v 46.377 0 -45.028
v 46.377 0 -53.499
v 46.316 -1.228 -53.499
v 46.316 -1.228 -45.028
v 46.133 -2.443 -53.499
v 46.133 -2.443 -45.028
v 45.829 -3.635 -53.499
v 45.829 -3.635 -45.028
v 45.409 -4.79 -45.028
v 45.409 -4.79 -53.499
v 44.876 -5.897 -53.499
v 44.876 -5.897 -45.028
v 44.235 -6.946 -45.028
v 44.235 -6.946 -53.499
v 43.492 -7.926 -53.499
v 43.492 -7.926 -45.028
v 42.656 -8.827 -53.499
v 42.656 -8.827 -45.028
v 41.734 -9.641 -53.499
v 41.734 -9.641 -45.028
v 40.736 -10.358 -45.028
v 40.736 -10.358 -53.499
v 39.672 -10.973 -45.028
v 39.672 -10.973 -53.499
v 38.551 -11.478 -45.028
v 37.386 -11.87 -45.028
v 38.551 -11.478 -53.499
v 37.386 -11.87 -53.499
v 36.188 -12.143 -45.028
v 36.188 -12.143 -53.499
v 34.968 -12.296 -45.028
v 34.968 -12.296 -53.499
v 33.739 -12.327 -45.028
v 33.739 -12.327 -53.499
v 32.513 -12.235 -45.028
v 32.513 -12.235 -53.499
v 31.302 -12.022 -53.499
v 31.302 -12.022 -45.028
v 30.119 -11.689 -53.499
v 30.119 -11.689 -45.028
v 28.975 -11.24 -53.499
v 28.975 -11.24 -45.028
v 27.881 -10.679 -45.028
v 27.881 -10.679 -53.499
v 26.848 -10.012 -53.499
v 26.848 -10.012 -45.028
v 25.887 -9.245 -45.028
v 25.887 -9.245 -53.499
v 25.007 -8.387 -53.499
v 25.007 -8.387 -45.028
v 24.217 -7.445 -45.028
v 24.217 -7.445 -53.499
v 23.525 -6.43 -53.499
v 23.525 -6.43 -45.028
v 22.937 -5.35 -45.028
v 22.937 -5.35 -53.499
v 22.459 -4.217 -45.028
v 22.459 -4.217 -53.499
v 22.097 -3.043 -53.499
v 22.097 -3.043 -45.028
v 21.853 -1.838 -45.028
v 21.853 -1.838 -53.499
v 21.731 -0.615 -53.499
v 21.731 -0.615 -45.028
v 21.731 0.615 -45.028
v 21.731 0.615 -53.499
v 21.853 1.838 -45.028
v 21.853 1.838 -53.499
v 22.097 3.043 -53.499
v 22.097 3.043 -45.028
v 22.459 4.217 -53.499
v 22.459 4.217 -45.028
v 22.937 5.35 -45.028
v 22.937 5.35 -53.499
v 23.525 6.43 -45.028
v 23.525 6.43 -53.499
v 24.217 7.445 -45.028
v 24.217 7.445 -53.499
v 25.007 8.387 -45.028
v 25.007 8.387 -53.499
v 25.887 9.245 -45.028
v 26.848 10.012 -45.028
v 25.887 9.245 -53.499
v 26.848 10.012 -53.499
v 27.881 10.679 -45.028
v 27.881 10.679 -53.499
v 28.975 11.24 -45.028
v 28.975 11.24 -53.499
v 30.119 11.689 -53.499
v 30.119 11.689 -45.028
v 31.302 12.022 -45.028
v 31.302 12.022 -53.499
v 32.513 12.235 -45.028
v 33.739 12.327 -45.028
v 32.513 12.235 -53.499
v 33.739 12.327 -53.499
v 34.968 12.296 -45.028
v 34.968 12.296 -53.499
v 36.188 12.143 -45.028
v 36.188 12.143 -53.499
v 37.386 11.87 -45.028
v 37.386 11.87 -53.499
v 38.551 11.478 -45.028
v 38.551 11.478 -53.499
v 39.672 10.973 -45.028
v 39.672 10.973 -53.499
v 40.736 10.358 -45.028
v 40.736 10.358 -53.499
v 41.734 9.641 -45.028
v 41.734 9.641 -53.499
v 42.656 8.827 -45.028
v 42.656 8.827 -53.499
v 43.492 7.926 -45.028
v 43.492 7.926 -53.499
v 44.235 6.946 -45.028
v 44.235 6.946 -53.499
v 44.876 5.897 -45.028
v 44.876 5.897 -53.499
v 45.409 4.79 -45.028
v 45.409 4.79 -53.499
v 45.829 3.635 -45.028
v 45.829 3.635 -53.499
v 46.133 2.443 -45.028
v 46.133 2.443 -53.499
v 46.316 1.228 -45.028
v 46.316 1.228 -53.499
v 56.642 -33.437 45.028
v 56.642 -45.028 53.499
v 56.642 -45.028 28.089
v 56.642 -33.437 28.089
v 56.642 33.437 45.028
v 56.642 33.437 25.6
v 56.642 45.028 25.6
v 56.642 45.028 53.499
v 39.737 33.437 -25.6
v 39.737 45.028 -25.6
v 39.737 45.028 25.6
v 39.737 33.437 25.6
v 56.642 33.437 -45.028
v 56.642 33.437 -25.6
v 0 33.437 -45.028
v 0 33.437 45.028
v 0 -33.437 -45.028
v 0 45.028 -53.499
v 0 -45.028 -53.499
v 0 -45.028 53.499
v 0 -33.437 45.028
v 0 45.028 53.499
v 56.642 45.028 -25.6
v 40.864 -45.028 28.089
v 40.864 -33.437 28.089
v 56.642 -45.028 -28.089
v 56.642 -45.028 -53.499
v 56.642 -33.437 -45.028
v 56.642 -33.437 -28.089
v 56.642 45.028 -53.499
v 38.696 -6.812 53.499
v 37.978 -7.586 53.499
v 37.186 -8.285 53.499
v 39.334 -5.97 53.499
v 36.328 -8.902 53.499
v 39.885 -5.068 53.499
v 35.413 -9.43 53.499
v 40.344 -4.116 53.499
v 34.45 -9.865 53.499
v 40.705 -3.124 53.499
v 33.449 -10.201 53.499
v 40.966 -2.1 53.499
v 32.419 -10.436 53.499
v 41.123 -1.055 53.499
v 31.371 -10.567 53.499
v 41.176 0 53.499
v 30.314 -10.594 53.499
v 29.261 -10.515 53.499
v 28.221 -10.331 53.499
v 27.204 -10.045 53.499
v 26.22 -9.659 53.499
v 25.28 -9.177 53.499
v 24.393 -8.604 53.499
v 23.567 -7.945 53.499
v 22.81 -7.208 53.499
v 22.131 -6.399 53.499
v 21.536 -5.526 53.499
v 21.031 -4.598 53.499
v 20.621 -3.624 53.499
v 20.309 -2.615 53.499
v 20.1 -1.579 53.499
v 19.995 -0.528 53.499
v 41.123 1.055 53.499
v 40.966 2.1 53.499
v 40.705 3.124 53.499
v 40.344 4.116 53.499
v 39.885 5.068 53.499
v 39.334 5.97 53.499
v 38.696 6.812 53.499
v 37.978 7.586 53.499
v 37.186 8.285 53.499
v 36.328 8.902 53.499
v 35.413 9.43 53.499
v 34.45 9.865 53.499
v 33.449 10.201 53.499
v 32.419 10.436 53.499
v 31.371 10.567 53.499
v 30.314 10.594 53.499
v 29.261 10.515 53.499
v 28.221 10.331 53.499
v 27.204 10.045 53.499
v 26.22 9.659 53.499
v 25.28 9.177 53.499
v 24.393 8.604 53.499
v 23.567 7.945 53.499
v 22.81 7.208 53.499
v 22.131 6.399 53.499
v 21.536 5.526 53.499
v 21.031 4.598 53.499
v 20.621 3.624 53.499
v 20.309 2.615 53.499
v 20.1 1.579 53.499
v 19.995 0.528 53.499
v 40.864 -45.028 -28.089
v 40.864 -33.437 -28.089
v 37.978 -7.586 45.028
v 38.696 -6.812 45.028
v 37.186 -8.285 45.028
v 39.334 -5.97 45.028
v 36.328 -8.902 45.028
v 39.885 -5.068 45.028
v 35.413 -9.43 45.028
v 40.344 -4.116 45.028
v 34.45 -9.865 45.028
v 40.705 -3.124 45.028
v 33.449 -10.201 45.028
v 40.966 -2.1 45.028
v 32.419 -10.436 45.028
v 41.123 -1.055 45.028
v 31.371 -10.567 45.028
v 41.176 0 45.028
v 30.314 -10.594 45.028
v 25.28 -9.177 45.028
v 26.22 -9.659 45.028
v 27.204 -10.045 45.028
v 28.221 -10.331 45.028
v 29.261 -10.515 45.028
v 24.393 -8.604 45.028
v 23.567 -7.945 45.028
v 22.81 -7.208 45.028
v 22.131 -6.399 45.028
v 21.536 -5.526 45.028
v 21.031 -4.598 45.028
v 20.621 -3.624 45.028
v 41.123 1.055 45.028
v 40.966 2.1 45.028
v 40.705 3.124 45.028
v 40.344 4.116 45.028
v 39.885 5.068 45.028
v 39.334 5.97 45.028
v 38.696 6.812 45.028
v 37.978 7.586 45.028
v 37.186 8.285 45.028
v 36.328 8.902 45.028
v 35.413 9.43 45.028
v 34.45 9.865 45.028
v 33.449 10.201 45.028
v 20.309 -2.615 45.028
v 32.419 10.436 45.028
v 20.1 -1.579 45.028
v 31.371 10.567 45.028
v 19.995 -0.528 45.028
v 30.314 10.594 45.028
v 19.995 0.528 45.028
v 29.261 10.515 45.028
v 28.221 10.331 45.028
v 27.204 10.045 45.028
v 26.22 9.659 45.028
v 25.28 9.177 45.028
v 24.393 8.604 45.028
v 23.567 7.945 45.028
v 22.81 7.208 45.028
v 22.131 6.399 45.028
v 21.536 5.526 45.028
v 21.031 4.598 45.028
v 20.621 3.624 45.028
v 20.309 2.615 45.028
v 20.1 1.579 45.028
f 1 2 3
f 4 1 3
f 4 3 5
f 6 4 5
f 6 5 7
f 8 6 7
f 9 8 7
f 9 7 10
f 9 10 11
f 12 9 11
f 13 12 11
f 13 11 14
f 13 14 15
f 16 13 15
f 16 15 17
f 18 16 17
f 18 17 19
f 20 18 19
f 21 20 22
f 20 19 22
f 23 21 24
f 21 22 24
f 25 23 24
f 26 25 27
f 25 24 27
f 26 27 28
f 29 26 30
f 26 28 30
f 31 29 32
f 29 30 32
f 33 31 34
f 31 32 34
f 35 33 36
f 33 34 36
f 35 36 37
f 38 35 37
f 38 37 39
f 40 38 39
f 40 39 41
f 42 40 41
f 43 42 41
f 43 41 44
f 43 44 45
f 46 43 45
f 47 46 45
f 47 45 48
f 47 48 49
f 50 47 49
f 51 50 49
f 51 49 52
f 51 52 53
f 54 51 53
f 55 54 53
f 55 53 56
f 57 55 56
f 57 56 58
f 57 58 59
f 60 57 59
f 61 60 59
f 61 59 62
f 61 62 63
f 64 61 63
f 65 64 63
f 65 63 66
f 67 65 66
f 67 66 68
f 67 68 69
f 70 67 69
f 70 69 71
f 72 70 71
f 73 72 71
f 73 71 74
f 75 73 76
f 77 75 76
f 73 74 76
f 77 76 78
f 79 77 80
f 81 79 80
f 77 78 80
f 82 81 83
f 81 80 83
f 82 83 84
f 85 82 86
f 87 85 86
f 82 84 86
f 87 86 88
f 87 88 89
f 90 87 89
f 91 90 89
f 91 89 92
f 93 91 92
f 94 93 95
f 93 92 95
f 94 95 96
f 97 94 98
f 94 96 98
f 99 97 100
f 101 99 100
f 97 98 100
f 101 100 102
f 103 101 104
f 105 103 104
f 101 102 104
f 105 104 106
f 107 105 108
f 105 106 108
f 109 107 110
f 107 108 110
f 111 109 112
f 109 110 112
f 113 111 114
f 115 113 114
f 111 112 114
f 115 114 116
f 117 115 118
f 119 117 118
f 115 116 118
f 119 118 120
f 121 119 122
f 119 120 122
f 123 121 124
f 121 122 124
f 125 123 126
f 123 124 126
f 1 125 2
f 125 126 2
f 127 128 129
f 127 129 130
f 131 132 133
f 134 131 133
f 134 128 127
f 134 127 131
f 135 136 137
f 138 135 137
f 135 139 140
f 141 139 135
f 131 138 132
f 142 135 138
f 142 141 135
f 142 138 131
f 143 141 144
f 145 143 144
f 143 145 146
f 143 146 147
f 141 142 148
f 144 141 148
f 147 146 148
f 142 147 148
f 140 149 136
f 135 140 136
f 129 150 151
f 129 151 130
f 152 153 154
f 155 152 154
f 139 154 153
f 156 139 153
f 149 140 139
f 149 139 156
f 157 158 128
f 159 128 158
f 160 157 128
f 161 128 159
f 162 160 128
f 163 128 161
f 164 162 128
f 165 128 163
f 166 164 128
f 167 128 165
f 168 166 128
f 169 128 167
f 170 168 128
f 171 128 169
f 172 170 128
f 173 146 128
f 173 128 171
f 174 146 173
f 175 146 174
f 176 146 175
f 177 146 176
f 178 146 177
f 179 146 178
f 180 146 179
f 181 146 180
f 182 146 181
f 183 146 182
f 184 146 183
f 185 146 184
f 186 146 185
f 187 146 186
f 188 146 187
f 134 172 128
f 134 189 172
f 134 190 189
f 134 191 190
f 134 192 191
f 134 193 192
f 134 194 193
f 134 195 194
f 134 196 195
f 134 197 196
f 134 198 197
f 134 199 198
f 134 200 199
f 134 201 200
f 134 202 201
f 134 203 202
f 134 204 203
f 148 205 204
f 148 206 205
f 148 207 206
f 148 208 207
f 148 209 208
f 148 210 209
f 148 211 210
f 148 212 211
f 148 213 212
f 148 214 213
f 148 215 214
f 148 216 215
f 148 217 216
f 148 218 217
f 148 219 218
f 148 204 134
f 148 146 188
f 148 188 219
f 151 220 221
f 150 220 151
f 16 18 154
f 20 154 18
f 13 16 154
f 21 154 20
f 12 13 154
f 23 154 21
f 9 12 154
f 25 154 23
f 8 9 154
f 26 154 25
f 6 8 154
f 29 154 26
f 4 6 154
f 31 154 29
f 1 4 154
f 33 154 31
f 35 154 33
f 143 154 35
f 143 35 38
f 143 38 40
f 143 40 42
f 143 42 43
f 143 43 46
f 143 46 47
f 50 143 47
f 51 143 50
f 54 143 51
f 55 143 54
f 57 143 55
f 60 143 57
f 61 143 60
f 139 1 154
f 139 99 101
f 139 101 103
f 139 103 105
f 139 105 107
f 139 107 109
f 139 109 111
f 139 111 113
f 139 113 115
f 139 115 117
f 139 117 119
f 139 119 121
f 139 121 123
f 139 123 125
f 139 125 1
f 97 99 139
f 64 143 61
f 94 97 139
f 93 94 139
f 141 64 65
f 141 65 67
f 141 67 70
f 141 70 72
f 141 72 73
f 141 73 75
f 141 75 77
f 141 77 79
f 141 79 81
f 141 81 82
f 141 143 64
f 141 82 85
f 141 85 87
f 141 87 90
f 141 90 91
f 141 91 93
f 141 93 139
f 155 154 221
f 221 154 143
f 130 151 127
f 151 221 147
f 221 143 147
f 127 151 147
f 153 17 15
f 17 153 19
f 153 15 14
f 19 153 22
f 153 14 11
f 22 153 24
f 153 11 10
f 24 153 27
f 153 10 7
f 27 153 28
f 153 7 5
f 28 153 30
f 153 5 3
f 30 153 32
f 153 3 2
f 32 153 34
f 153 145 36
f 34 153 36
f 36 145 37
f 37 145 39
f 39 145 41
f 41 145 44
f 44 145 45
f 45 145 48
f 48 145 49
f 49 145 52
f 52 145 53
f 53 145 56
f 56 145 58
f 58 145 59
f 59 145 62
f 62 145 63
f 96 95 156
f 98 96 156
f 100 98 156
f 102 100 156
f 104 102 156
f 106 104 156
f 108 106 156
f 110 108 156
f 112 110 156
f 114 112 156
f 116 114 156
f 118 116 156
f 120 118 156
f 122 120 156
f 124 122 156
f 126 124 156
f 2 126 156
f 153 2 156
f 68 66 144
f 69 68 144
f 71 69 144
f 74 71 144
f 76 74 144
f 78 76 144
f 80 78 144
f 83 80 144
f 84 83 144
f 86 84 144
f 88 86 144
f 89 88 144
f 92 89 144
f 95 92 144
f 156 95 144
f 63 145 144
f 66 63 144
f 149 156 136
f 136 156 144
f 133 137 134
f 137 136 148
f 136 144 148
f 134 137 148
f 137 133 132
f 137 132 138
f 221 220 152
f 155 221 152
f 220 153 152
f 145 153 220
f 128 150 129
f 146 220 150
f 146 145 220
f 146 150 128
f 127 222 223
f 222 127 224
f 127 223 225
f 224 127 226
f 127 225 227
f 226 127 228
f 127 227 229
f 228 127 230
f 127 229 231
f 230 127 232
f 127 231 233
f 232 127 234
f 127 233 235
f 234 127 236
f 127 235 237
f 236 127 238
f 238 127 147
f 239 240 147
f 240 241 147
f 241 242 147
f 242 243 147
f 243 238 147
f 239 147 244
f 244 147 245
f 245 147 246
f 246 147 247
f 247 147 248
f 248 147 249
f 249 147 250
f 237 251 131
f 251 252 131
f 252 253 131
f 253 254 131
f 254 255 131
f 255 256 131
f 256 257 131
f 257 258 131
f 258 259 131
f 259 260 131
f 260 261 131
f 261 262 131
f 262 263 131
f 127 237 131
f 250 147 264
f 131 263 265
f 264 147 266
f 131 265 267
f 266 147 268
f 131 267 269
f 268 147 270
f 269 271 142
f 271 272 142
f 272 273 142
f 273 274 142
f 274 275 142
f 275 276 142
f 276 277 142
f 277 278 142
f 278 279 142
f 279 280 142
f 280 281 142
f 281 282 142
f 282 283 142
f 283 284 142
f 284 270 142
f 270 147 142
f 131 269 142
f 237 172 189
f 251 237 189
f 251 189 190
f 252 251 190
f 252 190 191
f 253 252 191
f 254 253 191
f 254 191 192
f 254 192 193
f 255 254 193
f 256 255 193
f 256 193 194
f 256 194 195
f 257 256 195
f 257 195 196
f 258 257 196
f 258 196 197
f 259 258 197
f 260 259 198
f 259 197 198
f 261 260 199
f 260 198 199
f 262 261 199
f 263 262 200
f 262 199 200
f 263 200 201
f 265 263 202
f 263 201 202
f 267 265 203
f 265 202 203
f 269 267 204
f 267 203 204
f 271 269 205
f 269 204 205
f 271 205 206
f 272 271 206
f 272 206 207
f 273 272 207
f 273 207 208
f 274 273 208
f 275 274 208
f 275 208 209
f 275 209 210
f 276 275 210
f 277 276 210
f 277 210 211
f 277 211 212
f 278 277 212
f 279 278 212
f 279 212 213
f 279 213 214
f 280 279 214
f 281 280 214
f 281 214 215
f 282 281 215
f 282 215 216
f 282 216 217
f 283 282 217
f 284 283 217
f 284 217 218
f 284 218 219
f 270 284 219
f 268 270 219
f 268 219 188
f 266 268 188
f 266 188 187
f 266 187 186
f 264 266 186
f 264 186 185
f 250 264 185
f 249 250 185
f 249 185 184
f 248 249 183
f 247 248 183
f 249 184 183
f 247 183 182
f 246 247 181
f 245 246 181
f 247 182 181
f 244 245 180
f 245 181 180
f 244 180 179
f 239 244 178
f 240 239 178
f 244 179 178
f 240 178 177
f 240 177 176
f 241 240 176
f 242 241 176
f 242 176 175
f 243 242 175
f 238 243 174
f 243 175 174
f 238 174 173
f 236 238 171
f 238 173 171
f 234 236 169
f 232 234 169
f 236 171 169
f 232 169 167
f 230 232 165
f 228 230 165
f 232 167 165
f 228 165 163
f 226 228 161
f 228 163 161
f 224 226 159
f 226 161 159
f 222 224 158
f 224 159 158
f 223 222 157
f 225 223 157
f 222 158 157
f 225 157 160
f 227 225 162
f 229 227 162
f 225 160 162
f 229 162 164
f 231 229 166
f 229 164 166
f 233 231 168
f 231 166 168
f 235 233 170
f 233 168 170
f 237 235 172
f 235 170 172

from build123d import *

# Parameters (mm, degrees)
F0_W     = 90.0560617447
F0_H     = 106.9972887635
F0_W_2   = 66.873319447
F0_H_2   = 90.0560542941
F1_DEPTH = 56.642
F2_W     = 16.9049244328
F2_H     = 51.2000992894
F3_DEPTH = 25.4
F4_W     = 15.7775770826
F4_H     = 56.1789758503
F5_DEPTH = 25.4
F6_R     = 10.5970708349
F7_DEPTH = 25.4
F8_R     = 12.3308316968
F9_DEPTH = 25.4


with BuildPart() as f1:
    # F0 (on Right) → F1 (new body)
    with BuildSketch(Plane.YZ):
        Rectangle(F0_W, F0_H)
        Rectangle(F0_W_2, F0_H_2, mode=Mode.SUBTRACT)
    extrude(amount=F1_DEPTH)

    # F2 (on face) → F3 (cut)
    with BuildSketch(Plane(origin=(0, 45.0280308723, 0), x_dir=(-1, 0, 0), z_dir=(0, 1, 0))):
        with Locations((-48.1895377836, 0)):
            Rectangle(F2_W, F2_H)
    extrude(amount=-F3_DEPTH, mode=Mode.SUBTRACT)

    # F4 (on face) → F5 (cut)
    with BuildSketch(Plane.XZ.offset(45.0280308723)):
        with Locations((48.7532114587, 0)):
            Rectangle(F4_W, F4_H)
    extrude(amount=-F5_DEPTH, mode=Mode.SUBTRACT)

    # F6 (on face) → F7 (cut)
    with BuildSketch(Plane.XY.offset(53.4986443818)):
        with Locations((30.5786505342, 0)):
            Circle(F6_R)
    extrude(amount=-F7_DEPTH, mode=Mode.SUBTRACT)

    # F8 (on face) → F9 (cut)
    with BuildSketch(Plane(origin=(0, 0, -53.4986443818), x_dir=(1, 0, 0), z_dir=(0, 0, -1))):
        with Locations((34.0463332832, 0)):
            Circle(F8_R)
    extrude(amount=-F9_DEPTH, mode=Mode.SUBTRACT)


solid = f1.part
